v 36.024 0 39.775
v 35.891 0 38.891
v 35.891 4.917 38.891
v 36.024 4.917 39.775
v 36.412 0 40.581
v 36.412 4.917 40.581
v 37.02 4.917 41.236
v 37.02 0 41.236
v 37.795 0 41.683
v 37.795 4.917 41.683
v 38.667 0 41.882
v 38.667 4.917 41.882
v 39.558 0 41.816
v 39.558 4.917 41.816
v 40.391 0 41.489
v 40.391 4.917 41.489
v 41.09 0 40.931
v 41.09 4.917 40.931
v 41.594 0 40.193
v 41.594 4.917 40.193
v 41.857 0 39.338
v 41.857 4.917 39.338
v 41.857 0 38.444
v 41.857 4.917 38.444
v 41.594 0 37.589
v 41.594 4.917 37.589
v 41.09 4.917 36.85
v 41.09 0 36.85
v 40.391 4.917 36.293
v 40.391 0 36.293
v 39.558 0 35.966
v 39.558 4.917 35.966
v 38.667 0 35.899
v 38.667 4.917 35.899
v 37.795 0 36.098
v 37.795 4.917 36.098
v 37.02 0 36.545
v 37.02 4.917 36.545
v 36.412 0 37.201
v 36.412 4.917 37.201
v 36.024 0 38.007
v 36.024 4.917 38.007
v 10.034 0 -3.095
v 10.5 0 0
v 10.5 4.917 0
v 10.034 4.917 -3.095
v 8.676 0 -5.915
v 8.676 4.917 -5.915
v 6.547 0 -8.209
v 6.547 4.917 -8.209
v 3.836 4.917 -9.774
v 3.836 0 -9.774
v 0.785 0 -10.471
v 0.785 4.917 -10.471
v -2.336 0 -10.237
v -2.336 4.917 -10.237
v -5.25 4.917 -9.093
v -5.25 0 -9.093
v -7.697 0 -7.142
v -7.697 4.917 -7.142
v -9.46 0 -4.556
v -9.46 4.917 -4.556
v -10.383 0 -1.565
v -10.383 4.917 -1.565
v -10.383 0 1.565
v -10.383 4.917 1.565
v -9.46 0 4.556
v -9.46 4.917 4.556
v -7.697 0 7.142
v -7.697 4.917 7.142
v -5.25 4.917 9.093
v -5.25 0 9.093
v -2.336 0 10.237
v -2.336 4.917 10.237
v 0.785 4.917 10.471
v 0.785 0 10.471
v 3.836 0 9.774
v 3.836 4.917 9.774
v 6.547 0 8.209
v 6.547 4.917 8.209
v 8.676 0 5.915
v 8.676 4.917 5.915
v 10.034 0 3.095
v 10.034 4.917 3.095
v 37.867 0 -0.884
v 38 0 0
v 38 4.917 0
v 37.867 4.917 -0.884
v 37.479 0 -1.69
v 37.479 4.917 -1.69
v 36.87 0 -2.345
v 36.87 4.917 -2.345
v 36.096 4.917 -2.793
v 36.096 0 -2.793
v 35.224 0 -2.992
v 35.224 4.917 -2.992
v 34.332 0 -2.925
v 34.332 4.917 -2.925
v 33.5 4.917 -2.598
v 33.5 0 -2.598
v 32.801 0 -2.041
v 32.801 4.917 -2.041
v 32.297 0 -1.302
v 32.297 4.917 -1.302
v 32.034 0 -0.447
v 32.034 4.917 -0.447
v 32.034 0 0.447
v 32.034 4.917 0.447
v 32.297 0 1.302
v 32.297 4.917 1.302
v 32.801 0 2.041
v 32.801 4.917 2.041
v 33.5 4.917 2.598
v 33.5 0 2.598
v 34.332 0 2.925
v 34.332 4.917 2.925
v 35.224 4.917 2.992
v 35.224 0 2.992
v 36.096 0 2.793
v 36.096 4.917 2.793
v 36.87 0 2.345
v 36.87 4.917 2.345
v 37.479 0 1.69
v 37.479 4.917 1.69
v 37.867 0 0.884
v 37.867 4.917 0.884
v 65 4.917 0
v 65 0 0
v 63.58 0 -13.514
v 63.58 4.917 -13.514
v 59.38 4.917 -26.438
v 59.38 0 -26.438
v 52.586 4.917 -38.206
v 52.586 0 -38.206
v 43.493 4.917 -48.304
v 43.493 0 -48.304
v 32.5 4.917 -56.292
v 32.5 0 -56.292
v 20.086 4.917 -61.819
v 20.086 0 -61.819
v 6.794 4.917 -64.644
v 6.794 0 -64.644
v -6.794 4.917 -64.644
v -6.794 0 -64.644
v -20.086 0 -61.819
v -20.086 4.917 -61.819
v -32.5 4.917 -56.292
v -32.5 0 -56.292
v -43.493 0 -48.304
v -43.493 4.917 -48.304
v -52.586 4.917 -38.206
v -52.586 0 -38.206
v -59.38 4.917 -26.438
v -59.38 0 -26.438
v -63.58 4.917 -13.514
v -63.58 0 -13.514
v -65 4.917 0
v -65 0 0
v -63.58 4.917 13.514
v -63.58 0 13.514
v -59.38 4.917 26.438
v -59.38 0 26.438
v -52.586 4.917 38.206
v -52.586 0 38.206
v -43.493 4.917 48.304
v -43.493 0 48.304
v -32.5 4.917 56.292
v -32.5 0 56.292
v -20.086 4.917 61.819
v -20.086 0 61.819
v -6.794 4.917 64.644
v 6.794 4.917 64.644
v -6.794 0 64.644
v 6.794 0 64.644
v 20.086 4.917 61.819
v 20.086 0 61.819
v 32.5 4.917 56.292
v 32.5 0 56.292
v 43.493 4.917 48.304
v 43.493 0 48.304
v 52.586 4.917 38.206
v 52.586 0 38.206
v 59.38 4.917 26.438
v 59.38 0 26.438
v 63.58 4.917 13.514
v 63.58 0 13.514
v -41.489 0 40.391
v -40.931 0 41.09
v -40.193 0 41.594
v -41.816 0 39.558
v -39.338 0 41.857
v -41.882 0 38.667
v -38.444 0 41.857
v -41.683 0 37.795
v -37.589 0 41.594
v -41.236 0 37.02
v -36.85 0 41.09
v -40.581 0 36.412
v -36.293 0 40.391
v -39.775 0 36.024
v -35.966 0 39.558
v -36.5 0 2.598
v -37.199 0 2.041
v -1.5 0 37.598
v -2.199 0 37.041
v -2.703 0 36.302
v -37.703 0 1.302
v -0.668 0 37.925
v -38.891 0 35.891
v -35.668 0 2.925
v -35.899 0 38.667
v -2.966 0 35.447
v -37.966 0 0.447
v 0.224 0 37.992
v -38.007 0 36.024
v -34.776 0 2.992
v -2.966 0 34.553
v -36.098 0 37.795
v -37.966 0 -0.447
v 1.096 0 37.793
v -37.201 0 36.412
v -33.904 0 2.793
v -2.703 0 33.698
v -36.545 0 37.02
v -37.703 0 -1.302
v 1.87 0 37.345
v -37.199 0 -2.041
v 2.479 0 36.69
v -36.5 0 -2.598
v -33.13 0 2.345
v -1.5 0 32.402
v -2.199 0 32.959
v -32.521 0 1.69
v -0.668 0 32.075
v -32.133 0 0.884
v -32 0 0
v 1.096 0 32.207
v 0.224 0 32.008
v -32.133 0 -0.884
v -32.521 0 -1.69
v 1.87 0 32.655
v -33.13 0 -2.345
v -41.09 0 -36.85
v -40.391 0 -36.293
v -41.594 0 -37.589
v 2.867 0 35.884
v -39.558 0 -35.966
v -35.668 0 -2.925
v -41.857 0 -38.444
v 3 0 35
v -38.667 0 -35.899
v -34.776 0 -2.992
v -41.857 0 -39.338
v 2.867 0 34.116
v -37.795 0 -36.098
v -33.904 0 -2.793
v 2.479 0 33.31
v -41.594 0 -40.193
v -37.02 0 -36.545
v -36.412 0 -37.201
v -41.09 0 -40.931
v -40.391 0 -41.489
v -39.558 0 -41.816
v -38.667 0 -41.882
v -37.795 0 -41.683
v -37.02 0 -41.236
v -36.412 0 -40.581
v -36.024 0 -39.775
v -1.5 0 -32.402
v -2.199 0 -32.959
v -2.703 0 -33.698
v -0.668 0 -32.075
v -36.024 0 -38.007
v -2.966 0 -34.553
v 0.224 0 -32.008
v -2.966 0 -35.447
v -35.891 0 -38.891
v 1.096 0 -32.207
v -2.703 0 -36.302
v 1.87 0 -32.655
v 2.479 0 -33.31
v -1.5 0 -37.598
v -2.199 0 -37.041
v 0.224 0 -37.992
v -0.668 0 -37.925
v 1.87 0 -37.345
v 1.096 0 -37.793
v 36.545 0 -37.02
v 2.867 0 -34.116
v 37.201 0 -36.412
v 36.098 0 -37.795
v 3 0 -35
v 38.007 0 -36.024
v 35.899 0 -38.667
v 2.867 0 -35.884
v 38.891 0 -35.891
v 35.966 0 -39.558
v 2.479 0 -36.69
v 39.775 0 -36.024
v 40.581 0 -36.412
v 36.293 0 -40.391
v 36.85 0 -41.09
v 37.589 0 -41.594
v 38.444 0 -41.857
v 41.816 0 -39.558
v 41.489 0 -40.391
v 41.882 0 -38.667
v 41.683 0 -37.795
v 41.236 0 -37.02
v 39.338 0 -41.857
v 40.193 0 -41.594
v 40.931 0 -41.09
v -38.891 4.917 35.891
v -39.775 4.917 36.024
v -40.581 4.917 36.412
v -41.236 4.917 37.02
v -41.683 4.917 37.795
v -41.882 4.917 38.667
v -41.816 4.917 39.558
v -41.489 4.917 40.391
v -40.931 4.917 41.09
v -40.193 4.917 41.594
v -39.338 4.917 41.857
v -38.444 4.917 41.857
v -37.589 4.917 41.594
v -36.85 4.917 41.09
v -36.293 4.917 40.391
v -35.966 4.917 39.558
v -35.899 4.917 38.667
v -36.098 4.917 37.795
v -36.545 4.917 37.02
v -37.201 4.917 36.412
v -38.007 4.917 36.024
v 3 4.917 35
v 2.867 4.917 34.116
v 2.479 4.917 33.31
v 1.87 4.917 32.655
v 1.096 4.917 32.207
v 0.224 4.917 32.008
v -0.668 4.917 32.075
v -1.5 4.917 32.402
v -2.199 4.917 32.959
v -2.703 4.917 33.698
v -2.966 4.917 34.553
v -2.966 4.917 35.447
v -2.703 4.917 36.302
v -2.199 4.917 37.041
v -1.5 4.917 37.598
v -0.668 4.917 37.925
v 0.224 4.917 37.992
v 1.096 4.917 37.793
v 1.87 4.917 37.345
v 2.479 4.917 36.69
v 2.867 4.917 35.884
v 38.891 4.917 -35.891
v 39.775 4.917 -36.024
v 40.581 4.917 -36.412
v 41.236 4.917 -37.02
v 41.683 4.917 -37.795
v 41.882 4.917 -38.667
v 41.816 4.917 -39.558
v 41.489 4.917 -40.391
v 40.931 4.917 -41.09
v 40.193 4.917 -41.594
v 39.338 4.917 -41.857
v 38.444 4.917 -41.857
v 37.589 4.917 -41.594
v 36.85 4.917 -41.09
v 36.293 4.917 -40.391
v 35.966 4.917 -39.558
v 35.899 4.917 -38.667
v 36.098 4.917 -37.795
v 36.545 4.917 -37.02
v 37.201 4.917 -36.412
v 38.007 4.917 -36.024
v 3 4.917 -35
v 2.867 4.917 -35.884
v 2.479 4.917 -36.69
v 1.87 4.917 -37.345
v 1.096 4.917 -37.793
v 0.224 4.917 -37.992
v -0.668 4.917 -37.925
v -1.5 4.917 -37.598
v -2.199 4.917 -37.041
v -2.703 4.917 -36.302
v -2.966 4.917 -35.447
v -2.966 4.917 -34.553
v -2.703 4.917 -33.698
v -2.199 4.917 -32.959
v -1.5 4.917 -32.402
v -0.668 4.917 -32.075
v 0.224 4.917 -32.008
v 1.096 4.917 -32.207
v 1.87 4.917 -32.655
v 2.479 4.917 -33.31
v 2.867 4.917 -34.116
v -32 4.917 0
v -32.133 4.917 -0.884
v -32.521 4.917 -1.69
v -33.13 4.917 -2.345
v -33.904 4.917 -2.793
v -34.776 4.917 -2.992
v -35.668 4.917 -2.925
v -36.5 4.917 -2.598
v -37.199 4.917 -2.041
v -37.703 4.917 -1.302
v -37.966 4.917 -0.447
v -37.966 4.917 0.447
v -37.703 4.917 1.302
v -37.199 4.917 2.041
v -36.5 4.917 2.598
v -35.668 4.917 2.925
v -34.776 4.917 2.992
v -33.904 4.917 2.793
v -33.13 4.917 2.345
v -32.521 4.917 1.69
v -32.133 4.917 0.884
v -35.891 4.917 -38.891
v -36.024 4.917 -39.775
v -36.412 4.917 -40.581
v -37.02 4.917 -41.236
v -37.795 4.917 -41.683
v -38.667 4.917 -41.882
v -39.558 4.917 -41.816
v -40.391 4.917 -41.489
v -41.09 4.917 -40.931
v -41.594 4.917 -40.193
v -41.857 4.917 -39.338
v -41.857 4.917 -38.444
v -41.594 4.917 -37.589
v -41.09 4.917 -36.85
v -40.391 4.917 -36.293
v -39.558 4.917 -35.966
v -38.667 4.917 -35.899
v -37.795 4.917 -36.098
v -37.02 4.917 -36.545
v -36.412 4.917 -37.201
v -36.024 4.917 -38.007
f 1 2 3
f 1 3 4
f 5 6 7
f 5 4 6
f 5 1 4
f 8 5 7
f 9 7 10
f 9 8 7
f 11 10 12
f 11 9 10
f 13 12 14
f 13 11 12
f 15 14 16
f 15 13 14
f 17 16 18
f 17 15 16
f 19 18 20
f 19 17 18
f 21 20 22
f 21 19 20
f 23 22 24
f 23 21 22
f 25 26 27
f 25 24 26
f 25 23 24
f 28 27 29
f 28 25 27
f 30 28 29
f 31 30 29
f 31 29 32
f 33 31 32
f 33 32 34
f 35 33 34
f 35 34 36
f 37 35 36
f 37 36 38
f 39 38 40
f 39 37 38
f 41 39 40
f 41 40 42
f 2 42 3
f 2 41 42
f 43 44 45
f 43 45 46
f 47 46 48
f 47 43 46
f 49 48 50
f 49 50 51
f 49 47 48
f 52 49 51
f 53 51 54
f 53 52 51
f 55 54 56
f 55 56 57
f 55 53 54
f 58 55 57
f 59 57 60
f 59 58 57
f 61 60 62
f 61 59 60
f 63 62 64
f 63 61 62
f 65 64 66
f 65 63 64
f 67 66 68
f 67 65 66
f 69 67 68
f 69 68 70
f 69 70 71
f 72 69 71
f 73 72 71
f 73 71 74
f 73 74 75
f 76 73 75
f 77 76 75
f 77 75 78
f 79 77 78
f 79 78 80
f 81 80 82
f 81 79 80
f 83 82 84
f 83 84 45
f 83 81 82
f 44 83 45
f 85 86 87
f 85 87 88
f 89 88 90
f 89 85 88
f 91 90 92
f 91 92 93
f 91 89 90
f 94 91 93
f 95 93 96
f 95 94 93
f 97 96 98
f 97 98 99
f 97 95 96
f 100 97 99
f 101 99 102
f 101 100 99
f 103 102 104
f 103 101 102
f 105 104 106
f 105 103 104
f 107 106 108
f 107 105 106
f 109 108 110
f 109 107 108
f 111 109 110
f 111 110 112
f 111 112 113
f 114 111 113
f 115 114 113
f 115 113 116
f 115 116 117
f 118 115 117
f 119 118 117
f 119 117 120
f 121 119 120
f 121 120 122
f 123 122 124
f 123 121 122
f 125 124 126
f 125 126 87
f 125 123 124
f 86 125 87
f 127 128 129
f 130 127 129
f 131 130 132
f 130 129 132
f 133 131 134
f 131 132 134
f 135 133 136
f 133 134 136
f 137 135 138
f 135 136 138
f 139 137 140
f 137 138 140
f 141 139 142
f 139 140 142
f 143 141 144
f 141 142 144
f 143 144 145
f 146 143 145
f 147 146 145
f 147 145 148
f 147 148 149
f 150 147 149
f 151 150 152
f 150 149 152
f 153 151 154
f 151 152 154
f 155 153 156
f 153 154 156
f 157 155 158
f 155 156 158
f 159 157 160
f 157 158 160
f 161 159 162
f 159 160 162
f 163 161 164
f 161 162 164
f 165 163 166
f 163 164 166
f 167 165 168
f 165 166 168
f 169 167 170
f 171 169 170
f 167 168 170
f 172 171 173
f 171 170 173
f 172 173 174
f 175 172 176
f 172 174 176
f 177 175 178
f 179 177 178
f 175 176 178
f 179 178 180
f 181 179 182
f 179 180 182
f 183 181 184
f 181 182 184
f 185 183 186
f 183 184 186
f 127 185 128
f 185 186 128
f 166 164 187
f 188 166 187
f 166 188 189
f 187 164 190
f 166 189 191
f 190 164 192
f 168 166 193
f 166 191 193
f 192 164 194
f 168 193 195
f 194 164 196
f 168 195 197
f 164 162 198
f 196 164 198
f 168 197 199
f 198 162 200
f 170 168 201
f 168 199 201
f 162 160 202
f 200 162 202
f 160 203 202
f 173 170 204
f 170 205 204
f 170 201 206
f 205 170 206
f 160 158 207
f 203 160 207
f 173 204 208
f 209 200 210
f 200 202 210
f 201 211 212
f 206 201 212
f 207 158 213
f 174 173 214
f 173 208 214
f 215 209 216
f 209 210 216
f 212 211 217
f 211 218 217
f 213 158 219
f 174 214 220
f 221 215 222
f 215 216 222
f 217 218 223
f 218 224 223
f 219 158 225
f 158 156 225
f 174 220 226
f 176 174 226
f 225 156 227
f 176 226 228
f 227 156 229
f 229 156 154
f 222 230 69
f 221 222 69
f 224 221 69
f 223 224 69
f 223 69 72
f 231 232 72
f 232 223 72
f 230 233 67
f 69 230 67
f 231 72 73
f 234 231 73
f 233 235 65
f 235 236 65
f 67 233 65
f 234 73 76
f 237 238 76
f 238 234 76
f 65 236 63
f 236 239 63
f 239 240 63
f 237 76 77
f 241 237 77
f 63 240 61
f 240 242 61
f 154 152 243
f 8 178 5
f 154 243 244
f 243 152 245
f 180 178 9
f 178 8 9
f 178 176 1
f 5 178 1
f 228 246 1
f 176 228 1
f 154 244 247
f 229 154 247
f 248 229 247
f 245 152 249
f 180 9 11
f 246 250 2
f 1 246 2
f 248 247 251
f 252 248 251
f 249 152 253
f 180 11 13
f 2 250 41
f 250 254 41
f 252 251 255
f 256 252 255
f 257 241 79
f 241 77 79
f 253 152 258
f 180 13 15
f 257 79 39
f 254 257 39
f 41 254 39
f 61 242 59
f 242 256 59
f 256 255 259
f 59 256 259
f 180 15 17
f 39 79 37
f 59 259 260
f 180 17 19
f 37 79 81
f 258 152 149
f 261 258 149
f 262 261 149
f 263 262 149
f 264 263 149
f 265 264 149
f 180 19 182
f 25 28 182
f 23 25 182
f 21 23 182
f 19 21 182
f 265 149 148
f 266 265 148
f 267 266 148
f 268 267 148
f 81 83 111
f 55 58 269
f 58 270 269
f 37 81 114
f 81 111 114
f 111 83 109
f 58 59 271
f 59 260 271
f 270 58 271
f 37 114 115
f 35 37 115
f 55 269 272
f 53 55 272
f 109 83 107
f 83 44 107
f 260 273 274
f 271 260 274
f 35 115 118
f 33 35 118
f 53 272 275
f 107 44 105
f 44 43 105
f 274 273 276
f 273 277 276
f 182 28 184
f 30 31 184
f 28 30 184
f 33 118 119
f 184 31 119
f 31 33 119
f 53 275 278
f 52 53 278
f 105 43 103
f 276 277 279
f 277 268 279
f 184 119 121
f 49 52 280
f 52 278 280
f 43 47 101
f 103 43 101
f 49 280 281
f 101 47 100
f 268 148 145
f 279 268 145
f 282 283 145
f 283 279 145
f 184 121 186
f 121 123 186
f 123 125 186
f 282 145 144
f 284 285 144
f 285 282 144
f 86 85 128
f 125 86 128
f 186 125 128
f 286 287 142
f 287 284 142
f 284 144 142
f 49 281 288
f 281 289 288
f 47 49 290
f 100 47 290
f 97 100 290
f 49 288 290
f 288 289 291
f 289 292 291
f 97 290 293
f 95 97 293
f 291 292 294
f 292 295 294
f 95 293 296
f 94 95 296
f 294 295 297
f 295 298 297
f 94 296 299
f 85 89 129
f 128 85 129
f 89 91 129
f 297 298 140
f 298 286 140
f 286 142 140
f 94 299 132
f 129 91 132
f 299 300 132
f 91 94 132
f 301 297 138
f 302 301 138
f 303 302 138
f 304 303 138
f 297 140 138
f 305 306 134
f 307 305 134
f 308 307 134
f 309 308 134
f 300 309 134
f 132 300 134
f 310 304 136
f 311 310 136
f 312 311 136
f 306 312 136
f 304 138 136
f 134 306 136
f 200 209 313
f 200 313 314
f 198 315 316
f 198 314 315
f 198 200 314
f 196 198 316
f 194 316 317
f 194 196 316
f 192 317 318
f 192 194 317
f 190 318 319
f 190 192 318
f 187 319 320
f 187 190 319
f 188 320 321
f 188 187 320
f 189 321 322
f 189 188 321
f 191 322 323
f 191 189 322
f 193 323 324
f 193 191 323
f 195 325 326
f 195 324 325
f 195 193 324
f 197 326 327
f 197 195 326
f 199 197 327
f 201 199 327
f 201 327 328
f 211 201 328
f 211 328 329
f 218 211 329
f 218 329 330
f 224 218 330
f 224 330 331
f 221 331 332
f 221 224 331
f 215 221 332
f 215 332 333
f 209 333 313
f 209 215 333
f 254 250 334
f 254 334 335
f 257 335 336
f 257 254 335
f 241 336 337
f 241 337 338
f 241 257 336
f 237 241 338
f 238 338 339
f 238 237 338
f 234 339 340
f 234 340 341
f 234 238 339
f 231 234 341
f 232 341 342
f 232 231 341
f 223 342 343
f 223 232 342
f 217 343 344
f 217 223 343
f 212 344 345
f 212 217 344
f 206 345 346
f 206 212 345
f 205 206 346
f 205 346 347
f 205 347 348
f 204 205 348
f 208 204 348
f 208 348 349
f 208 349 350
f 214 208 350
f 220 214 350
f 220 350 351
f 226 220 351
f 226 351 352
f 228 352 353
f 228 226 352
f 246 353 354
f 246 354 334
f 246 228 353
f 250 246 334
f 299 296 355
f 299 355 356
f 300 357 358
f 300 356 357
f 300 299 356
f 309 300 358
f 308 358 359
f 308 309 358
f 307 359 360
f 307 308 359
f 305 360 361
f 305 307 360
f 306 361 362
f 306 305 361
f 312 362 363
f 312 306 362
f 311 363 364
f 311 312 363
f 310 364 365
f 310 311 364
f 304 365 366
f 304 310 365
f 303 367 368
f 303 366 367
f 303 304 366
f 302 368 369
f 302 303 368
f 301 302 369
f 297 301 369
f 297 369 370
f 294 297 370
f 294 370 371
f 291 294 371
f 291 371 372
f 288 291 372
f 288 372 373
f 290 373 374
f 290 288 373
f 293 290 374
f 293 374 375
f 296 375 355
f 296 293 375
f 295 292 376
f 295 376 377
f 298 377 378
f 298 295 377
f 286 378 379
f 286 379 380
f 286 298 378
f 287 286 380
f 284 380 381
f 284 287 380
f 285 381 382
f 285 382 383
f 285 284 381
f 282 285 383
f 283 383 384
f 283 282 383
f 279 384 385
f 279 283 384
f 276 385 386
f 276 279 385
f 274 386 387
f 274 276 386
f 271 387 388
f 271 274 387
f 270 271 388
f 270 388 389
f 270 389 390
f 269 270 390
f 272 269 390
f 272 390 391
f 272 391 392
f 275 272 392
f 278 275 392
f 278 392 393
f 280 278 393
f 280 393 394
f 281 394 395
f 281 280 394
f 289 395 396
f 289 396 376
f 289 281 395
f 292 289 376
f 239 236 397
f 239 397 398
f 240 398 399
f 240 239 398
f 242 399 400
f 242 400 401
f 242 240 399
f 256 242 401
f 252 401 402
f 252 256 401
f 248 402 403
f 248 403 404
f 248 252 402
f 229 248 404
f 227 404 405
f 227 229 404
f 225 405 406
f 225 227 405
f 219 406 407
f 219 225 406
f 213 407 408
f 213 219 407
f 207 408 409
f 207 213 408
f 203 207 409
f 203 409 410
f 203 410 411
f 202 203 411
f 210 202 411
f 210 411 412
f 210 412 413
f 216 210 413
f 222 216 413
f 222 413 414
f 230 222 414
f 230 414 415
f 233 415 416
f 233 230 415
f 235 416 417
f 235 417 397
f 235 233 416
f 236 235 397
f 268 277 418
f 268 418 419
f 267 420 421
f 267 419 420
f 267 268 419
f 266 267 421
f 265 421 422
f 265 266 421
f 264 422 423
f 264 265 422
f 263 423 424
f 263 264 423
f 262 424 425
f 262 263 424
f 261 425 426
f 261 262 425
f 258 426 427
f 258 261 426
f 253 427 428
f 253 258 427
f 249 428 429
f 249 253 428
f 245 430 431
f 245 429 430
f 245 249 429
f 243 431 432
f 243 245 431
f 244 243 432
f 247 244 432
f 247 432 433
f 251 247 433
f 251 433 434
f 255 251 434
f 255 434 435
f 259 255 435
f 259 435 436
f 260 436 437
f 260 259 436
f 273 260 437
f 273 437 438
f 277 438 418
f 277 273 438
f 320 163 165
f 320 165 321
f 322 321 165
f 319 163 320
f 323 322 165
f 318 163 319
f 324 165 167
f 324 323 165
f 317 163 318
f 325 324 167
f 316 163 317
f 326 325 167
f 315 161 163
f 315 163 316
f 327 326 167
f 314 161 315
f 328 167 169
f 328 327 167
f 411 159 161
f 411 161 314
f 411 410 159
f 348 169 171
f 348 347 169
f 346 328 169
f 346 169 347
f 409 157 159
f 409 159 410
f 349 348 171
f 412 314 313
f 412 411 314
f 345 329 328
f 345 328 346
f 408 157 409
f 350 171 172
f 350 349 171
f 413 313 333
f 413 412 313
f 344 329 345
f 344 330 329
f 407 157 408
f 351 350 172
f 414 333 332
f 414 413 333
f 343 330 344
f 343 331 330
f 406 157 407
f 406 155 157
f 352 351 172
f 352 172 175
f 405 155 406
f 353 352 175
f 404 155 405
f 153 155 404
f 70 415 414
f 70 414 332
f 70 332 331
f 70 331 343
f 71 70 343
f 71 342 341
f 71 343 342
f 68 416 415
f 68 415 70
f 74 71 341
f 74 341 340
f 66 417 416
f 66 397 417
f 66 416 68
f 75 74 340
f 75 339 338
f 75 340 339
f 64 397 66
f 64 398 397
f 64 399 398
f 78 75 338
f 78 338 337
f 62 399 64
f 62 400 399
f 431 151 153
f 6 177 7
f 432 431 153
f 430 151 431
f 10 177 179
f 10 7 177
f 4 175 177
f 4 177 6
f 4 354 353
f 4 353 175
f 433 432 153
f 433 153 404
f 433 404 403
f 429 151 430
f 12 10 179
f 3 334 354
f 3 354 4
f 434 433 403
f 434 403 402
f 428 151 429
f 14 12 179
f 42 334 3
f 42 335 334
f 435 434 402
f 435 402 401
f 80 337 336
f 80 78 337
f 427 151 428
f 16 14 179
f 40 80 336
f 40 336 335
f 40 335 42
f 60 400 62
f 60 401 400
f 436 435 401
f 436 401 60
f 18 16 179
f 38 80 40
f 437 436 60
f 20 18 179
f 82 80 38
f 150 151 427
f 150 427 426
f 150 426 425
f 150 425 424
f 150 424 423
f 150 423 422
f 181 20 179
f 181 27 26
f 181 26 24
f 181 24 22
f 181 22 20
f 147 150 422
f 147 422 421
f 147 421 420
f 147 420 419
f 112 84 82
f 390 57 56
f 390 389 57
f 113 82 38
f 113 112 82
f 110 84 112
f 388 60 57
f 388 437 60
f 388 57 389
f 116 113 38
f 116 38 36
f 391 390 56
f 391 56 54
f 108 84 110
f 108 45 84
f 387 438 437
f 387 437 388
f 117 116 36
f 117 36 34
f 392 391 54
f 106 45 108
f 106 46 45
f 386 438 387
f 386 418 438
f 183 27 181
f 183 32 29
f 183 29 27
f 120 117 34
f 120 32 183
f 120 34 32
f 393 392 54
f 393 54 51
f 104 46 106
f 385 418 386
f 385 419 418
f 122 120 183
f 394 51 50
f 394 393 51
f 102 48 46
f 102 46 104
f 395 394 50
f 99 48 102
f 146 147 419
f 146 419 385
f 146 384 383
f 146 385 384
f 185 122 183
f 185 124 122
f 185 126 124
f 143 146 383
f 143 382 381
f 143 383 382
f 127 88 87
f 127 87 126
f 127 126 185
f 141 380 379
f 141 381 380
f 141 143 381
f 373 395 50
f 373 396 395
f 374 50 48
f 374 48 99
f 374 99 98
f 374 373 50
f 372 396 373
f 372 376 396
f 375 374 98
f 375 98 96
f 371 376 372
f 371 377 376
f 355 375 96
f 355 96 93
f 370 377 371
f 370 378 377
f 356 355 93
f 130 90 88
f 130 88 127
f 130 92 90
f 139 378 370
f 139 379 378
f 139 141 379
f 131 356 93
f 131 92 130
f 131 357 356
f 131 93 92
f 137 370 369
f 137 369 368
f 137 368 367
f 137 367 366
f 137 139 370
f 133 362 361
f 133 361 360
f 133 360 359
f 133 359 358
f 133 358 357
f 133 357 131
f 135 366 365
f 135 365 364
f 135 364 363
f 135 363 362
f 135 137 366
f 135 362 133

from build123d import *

# Parameters (mm, degrees)
SKETCH_1_R         = 65
SKETCH_1_R_2       = 3
SKETCH_1_R_3       = 10.5
EXTRUDE_3_DEPTH    = 4.917000374
CUT_EXTRUDE1_START = -5.917000374
SKETCH1_R          = 3
CUT_EXTRUDE1_DEPTH = 6.917000374
CIRPATTERN1_COUNT  = 4


with BuildPart() as part:
    # 草圖1 → 填料-伸長3 (new body)
    with BuildSketch(Plane(origin=(0, 0, 0), x_dir=(1, 0, 0), z_dir=(0, 1, 0))):
        Circle(SKETCH_1_R)
        with Locations((-35, 0)):
            Circle(SKETCH_1_R_2, mode=Mode.SUBTRACT)
        with Locations((35, 0)):
            Circle(SKETCH_1_R_2, mode=Mode.SUBTRACT)
        with Locations((0, -35)):
            Circle(SKETCH_1_R_2, mode=Mode.SUBTRACT)
        with Locations((0, 35)):
            Circle(SKETCH_1_R_2, mode=Mode.SUBTRACT)
        Circle(SKETCH_1_R_3, mode=Mode.SUBTRACT)
    extrude(amount=EXTRUDE_3_DEPTH)

    # Sketch1 → Cut-Extrude1 (cut)
    with BuildSketch(Plane(origin=(0, 4.917000374, 0), x_dir=(1, 0, 0), z_dir=(0, 1, 0)).offset(CUT_EXTRUDE1_START)):
        with Locations((-38.890872965, 38.890872965)):
            Circle(SKETCH1_R)
    cut_extrude1 = extrude(amount=CUT_EXTRUDE1_DEPTH, mode=Mode.SUBTRACT)

    # CirPattern1: Cut-Extrude1 ×4 about axis
    cirpattern1_axis = Axis((0, 0, 0), (0, 1, 0))
    for i in range(1, CIRPATTERN1_COUNT):
        add(cut_extrude1.rotate(cirpattern1_axis, i * 360 / CIRPATTERN1_COUNT), mode=Mode.SUBTRACT)


solid = part.part
